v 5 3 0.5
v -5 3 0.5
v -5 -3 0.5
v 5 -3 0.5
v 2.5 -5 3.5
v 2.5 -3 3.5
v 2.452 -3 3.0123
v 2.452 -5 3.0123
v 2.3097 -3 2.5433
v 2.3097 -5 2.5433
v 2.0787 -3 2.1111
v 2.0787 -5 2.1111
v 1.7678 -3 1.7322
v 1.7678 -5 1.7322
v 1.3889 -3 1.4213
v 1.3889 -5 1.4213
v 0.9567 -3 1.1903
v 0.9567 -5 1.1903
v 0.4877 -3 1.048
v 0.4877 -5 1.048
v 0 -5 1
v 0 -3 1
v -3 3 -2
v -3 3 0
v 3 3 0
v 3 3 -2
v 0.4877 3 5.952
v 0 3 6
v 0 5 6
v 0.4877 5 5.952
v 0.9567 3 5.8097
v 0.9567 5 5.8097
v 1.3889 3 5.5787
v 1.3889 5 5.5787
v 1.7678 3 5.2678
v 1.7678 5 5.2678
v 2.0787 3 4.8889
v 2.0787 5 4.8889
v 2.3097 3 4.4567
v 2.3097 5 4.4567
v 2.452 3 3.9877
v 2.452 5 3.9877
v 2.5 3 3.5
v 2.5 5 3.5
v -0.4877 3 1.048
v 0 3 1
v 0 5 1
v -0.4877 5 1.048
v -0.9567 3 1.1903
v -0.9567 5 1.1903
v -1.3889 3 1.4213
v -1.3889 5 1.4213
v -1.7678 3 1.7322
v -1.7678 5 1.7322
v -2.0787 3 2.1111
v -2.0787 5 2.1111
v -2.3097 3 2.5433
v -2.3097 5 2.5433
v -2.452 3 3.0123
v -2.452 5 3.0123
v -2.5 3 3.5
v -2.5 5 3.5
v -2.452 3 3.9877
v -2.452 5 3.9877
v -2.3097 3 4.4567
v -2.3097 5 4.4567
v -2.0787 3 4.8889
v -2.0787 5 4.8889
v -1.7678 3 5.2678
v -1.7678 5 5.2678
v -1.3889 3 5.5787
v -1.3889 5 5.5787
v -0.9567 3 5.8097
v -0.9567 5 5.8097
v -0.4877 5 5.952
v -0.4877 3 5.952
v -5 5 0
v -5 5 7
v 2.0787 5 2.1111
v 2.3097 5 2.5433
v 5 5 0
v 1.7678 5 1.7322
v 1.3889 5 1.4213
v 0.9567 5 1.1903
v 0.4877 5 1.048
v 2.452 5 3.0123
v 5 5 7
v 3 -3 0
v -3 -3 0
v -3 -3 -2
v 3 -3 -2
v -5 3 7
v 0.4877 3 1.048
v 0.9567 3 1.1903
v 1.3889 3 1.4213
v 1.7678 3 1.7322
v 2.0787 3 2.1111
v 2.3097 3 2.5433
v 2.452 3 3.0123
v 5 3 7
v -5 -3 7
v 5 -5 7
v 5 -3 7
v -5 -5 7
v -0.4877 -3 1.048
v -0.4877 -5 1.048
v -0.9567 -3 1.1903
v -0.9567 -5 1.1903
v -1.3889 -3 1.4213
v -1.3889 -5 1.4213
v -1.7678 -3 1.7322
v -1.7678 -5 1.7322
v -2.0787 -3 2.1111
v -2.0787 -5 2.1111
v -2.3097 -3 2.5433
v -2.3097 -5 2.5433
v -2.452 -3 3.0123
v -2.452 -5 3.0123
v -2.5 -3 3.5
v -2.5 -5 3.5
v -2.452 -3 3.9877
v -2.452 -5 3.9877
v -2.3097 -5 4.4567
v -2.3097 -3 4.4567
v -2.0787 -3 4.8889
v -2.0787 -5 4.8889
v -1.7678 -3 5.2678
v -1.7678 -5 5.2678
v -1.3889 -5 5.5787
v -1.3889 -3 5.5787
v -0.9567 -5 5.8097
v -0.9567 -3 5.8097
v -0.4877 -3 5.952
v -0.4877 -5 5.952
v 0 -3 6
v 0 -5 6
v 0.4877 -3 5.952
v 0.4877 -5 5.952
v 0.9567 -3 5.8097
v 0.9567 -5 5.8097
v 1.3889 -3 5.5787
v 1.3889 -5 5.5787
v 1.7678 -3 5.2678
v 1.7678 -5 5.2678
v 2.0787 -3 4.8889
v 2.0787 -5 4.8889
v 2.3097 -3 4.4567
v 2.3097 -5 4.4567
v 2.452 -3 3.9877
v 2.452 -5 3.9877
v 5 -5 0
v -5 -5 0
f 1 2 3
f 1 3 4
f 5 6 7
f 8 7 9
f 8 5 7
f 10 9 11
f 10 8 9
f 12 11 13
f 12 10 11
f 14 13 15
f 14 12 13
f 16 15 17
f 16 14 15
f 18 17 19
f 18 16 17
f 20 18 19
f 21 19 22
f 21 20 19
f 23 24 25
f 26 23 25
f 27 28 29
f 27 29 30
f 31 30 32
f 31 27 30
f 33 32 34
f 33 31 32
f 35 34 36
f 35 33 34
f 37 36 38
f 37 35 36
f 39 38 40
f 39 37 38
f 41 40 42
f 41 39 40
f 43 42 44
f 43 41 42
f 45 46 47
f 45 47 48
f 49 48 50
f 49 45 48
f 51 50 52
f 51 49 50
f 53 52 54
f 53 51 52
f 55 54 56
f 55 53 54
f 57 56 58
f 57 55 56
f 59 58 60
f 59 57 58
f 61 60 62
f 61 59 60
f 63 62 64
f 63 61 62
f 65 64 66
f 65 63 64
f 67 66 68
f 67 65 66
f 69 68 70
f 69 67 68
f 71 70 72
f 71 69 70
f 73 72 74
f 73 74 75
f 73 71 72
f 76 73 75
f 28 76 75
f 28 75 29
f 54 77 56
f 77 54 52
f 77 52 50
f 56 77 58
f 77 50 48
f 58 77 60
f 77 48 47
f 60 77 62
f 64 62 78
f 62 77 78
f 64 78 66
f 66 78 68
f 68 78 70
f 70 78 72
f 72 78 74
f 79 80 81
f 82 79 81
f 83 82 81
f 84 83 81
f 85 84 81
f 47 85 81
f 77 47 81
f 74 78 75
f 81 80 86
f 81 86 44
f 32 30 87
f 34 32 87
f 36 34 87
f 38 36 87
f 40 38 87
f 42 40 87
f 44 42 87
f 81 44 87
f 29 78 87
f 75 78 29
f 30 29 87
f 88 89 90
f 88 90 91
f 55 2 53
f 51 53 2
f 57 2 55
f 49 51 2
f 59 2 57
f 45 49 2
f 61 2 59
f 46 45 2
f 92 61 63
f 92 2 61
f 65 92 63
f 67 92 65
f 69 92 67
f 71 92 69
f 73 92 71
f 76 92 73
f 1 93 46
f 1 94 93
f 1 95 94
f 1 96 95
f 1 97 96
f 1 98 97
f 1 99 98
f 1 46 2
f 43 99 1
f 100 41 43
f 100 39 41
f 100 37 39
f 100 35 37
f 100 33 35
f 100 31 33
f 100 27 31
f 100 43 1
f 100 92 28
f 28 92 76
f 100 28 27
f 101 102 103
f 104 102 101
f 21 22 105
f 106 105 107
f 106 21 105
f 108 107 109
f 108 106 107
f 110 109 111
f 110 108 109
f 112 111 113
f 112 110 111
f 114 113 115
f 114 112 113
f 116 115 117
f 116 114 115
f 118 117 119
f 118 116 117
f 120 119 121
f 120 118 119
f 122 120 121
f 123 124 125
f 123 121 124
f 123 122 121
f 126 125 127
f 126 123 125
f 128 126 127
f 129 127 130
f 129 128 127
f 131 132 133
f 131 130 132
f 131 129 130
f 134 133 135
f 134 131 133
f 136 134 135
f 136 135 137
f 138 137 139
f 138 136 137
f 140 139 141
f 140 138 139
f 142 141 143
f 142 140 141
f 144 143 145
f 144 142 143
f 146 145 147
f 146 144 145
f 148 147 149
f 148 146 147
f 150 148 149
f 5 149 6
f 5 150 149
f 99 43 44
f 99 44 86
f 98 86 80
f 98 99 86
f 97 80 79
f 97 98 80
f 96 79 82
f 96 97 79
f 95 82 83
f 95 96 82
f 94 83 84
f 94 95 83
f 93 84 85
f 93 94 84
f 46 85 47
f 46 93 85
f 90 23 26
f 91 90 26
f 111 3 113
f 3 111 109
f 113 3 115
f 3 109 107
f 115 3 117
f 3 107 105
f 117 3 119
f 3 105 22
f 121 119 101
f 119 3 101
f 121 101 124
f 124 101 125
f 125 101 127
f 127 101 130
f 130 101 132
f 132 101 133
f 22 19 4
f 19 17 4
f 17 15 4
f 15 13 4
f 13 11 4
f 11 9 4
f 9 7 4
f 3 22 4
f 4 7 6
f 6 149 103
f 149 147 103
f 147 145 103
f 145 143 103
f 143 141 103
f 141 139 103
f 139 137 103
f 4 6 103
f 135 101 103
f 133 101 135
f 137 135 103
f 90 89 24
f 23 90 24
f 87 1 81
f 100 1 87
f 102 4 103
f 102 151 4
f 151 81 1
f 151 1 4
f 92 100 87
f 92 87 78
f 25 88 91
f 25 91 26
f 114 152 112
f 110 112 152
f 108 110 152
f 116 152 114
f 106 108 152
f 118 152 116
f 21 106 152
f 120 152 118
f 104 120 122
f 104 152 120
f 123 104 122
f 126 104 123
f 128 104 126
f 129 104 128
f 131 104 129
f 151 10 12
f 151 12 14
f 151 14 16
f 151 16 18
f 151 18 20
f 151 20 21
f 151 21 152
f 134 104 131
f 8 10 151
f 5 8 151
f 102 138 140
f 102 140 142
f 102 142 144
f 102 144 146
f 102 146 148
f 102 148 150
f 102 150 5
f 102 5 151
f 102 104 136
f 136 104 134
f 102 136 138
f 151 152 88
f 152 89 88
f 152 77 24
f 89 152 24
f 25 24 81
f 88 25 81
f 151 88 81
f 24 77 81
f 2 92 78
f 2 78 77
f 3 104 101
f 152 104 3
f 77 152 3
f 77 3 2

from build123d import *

# Parameters (mm, degrees)
F0_W     = 6
F0_H     = 6
F1_DEPTH = 2
F0_W_2   = 2
F2_DEPTH = 0.5
F4_DEPTH = 10
F5_W     = 10
F5_H     = 6
F6_DEPTH = 6.5


with BuildPart() as f1:
    # F0 (on Top) → F1 (new body)
    with BuildSketch(Plane.XY):
        Rectangle(F0_W, F0_H)
    extrude(amount=-F1_DEPTH)

    # F0 (on Top) → F2 (join)
    with BuildSketch(Plane.XY):
        Polygon((5, 3), (5, 5), (-5, 5), (-5, 3), (-3, 3), (3, 3), align=None)
        Rectangle(F0_W, F0_H)
        with Locations((-4, 0)):
            Rectangle(F0_W_2, F0_H)
        Polygon((5, -5), (5, -3), (3, -3), (-3, -3), (-5, -3), (-5, -5), align=None)
        with Locations((4, 0)):
            Rectangle(F0_W_2, F0_H)
    extrude(amount=F2_DEPTH)

    # F3 (on face) → F4 (join)
    with BuildSketch(Plane.XZ.offset(5)):
        with BuildLine():
            Line((0, 1), (0, 0.5))
            Line((0, 0.5), (5, 0.5))
            Line((5, 0.5), (5, 7))
            Line((5, 7), (0, 7))
            Line((0, 7), (0, 6))
            ThreePointArc((0, 6), (1.767767, 5.267767), (2.5, 3.5))
            ThreePointArc((2.5, 3.5), (1.767767, 1.732233), (0, 1))
        make_face()
        with BuildLine():
            Line((-5, 7), (-5, 0.5))
            Line((-5, 0.5), (0, 0.5))
            Line((0, 0.5), (0, 1))
            ThreePointArc((0, 1), (-2.5, 3.5), (0, 6))
            Line((0, 6), (0, 7))
            Line((0, 7), (-5, 7))
        make_face()
    extrude(amount=-F4_DEPTH)

    # F5 (on face) → F6 (cut)
    with BuildSketch(Plane.XY.offset(7)):
        Rectangle(F5_W, F5_H)
    extrude(amount=-F6_DEPTH, mode=Mode.SUBTRACT)


solid = f1.part
